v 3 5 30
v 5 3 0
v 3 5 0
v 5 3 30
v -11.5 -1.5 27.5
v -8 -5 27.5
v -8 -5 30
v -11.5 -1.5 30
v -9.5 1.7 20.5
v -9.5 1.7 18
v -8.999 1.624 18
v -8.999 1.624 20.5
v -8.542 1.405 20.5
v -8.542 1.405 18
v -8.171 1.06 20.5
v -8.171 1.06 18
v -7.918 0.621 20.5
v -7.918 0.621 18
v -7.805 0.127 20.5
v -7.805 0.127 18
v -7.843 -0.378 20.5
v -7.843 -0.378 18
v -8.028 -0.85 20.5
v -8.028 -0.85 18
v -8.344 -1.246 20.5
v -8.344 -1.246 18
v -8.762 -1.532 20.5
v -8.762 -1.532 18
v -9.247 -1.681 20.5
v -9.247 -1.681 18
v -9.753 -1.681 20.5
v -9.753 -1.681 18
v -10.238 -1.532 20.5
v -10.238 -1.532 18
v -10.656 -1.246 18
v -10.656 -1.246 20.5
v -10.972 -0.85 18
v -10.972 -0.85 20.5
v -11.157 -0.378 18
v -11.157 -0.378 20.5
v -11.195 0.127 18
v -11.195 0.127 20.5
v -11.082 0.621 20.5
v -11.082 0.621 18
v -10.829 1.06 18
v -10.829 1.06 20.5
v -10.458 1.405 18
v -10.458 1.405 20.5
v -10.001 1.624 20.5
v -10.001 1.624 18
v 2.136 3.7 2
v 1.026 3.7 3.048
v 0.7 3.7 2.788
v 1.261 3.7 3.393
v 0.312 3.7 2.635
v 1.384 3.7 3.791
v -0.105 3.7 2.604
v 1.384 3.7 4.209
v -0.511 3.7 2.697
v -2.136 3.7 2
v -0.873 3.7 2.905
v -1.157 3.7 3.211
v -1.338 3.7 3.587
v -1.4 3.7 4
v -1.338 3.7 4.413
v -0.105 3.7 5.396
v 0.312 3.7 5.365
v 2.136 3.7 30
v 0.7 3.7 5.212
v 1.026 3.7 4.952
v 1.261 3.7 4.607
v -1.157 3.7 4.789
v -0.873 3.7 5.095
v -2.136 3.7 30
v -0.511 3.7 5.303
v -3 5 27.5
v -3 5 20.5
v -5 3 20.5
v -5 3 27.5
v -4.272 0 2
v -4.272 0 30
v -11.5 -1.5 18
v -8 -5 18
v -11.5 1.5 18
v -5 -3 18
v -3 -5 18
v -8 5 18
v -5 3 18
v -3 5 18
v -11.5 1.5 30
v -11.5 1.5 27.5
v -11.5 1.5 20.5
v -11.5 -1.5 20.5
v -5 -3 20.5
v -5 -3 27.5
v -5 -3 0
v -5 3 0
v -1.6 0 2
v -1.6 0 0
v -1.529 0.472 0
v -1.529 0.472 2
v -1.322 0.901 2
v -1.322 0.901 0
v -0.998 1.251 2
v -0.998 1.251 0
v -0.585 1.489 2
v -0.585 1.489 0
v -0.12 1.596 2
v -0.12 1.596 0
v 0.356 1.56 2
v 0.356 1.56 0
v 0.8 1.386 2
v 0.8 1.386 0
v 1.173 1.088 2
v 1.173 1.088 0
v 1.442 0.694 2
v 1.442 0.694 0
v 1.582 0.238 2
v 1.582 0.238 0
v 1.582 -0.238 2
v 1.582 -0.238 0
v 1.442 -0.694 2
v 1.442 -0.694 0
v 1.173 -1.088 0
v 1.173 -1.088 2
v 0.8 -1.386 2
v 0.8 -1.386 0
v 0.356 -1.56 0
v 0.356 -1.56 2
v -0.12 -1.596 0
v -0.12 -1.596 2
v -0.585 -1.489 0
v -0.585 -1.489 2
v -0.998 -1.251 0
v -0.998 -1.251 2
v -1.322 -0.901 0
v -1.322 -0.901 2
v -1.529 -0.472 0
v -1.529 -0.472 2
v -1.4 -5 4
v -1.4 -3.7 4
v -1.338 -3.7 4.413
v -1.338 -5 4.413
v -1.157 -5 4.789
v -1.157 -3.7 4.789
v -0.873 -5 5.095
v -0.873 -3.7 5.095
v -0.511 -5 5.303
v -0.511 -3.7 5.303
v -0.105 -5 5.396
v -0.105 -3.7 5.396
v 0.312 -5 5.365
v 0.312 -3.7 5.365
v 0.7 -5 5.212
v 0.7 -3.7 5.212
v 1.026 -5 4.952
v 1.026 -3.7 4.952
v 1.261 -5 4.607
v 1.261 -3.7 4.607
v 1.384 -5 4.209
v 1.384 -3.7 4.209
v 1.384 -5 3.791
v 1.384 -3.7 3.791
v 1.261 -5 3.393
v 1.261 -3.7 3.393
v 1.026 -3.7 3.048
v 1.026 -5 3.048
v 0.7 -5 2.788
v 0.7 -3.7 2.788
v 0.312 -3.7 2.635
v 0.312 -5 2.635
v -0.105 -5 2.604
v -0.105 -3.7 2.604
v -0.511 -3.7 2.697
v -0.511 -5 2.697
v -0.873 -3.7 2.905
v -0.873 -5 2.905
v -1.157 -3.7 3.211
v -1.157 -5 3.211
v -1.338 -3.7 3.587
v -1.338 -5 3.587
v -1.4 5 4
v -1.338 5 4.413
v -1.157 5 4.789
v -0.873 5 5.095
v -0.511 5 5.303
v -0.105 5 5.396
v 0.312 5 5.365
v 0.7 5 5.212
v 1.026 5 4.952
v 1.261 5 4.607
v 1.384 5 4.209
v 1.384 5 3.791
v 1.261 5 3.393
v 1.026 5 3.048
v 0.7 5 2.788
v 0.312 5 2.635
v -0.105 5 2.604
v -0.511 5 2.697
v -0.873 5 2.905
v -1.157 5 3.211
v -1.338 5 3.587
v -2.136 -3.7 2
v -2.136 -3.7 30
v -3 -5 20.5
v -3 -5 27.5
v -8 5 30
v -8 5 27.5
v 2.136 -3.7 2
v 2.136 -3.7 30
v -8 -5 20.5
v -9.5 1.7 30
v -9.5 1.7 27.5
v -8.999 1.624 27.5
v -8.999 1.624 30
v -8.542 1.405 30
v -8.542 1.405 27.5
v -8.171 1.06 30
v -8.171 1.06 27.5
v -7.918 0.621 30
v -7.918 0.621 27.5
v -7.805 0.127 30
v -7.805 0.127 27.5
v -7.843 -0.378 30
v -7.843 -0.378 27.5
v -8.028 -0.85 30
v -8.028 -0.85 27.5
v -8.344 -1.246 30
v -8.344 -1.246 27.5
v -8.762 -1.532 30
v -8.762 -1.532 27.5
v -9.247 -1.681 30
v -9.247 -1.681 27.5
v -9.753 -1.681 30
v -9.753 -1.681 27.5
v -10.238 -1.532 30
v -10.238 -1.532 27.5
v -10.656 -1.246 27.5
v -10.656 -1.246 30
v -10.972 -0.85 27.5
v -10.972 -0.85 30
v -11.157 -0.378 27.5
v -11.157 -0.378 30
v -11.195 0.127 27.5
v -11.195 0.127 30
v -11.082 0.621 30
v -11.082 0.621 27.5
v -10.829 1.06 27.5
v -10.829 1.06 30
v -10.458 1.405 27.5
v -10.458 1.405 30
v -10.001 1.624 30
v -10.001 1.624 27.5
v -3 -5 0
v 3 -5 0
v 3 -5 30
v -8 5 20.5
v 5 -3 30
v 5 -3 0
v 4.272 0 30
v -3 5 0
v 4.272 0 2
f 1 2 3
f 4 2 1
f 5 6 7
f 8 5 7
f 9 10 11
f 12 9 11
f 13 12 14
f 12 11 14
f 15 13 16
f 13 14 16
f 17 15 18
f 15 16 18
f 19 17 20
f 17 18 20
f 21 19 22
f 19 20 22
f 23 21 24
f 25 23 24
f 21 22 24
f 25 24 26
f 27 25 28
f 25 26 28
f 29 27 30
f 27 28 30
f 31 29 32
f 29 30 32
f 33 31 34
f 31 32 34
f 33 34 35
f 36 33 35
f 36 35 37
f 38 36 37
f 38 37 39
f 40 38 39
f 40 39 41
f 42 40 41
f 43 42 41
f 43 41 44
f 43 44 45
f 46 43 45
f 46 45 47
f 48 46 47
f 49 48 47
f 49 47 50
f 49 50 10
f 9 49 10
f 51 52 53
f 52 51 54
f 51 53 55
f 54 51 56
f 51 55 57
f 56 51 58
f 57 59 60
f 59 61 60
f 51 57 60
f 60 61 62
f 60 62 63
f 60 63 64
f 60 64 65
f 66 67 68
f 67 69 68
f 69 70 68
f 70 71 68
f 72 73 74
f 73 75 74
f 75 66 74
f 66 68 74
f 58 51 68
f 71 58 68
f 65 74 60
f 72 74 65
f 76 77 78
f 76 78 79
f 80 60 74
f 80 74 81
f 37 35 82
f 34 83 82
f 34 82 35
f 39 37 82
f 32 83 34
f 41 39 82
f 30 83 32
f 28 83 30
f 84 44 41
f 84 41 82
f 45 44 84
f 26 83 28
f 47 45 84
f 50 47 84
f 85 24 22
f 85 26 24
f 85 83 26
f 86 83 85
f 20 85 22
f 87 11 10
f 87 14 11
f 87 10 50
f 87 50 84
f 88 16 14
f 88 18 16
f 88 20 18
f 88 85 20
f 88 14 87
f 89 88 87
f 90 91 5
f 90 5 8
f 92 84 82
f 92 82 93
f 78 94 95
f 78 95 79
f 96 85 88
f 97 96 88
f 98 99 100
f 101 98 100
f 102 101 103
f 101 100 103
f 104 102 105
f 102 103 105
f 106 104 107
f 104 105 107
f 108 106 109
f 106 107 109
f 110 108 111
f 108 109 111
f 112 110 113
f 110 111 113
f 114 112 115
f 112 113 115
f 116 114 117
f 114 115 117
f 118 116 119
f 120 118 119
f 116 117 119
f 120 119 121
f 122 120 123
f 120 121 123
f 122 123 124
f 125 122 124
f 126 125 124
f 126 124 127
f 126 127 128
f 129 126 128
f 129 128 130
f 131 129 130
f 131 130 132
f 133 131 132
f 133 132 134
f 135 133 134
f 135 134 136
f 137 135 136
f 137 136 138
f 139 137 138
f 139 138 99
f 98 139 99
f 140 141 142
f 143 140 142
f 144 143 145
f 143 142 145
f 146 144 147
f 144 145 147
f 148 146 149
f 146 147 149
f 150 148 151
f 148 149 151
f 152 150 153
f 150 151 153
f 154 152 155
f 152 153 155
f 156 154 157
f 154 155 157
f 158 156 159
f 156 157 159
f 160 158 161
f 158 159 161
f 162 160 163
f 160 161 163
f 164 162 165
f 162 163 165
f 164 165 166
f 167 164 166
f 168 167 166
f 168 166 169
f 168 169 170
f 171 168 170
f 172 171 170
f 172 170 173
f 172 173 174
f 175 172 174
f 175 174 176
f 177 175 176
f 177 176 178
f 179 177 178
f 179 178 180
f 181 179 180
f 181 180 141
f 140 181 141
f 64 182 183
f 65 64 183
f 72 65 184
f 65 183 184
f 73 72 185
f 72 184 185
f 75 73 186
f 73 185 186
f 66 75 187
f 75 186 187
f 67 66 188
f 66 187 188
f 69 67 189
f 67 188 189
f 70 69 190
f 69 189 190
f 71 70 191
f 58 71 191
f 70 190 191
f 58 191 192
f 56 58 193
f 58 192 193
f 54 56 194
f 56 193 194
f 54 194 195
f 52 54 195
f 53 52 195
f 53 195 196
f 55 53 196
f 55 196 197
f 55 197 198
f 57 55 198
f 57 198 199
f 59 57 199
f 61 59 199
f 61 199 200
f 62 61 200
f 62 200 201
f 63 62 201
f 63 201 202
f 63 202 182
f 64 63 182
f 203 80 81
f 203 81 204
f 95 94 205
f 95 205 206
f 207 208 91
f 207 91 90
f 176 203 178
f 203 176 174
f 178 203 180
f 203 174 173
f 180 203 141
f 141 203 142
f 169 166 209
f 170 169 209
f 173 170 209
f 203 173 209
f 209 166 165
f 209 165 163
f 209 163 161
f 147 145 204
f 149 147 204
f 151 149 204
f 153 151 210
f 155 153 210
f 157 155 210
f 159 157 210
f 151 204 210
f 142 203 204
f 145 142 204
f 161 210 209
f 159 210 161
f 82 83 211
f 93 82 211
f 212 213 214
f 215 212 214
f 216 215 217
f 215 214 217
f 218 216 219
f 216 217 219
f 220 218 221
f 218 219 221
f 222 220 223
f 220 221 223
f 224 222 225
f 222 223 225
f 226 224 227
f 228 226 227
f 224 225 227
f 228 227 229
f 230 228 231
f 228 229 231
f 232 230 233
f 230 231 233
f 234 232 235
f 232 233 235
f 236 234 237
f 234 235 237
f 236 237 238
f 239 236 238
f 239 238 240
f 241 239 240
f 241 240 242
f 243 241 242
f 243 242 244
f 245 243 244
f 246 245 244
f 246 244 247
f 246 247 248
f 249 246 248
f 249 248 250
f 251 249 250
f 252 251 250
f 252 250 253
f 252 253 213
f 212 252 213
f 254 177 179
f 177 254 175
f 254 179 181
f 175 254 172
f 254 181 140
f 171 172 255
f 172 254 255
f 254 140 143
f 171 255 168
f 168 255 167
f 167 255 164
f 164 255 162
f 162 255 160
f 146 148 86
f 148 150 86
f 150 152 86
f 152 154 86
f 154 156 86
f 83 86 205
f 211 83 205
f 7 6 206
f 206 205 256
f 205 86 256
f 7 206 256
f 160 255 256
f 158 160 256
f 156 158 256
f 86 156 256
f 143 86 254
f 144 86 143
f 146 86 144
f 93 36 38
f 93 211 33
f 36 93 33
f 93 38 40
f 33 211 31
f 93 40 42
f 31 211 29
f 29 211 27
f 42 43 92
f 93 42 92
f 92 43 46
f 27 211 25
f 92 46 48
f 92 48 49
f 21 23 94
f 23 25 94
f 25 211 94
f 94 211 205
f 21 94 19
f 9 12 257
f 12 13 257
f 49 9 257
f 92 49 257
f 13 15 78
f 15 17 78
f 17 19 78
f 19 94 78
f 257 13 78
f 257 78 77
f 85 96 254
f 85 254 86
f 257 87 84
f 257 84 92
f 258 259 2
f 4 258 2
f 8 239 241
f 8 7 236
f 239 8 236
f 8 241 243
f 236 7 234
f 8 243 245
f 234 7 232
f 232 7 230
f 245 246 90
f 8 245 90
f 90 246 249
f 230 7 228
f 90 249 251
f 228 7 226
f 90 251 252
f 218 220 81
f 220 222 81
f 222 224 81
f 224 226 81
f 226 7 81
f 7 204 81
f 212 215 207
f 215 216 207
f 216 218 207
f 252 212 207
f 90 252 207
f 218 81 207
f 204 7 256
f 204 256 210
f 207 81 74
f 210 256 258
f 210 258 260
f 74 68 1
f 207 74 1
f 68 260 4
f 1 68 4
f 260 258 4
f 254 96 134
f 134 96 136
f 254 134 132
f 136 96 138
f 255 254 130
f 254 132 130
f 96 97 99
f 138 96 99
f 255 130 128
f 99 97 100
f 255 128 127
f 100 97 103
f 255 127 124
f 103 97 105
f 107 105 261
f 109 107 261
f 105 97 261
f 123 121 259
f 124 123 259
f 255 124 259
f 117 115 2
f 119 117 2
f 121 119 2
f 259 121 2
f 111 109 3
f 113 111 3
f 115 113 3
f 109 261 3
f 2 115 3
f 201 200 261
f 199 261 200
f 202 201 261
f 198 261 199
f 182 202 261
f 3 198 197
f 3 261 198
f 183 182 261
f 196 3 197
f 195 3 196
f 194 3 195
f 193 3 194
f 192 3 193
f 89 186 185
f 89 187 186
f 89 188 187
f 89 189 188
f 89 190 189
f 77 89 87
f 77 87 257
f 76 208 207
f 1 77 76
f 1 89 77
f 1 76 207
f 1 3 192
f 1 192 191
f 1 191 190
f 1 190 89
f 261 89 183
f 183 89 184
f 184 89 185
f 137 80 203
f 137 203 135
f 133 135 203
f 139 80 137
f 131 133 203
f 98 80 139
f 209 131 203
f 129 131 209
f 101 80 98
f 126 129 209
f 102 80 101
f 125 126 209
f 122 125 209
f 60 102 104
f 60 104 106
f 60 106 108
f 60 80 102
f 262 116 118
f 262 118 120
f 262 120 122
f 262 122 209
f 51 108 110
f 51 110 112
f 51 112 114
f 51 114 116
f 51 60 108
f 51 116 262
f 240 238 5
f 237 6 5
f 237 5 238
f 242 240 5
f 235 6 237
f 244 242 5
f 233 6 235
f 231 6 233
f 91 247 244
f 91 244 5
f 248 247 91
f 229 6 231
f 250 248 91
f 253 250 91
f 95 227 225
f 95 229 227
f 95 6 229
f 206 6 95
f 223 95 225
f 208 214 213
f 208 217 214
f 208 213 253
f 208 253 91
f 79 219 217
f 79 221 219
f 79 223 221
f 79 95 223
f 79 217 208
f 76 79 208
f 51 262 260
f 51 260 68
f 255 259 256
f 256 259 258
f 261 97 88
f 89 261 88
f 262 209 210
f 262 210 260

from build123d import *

# Parameters (mm, degrees)
ESQUISSE1_W             = 10
ESQUISSE1_H             = 10
BOSS_EXTRU_1_DEPTH      = 30
ENL_V_MAT_EXTRU_1_DEPTH = 28
ESQUISSE3_R             = 1.6
ENL_V_MAT_EXTRU_2_DEPTH = 31.822070015
ESQUISSE4_W             = 2.5
ESQUISSE4_H             = 10
BOSS_EXTRU_2_DEPTH      = 6.5
CHANFREIN2_SIZE         = 3.5
ESQUISSE5_R             = 1.7
ENL_V_MAT_EXTRU_3_DEPTH = 22.937410968
CHANFREIN3_SIZE         = 2
ESQUISSE9_R             = 1.4
ENL_V_MAT_EXTRU_4_DEPTH = 10


with BuildPart() as part:
    # Esquisse1 → Boss.-Extru.1 (new body)
    with BuildSketch(Plane.XY):
        Rectangle(ESQUISSE1_W, ESQUISSE1_H)
    extrude(amount=BOSS_EXTRU_1_DEPTH)

    # Esquisse2 → Enlèv. mat.-Extru.1 (cut)
    with BuildSketch(Plane.XY.offset(30)):
        Polygon((-4.272391992, 0), (-2.136195996, -3.7), (2.136195996, -3.7), (4.272391992, 0), (2.136195996, 3.7), (-2.136195996, 3.7), align=None)
    extrude(amount=-ENL_V_MAT_EXTRU_1_DEPTH, mode=Mode.SUBTRACT)

    # Esquisse3 → Enlèv. mat.-Extru.2 (cut, through all)
    with BuildSketch(Plane(origin=(0, 0, 0), x_dir=(-1, 0, 0), z_dir=(0, 0, -1))):
        Circle(ESQUISSE3_R)
    extrude(amount=-ENL_V_MAT_EXTRU_2_DEPTH, mode=Mode.SUBTRACT)

    # Esquisse4 → Boss.-Extru.2 (add)
    with BuildSketch(Plane.ZY.offset(5)):
        with Locations((28.75, 0)):
            Rectangle(ESQUISSE4_W, ESQUISSE4_H)
        with Locations((19.25, 0)):
            Rectangle(ESQUISSE4_W, ESQUISSE4_H)
    extrude(amount=BOSS_EXTRU_2_DEPTH)

    # Chanfrein2
    chanfrein2_edges = [part.edges().sort_by_distance(p)[0] for p in [
        (-11.5, -5, 28.75),
        (-11.5, 5, 28.75),
        (-11.5, -5, 19.25),
        (-11.5, 5, 19.25),
    ]]
    chamfer(chanfrein2_edges, length=CHANFREIN2_SIZE)

    # Esquisse5 → Enlèv. mat.-Extru.3 (cut, through all)
    with BuildSketch(Plane(origin=(0, 0, 18), x_dir=(-1, 0, 0), z_dir=(0, 0, -1))):
        with Locations(Location((9.5, 0, 0), (0, 0, 90))):
            Circle(ESQUISSE5_R)
    extrude(amount=-ENL_V_MAT_EXTRU_3_DEPTH, mode=Mode.SUBTRACT)

    # Chanfrein3
    chanfrein3_edges = [part.edges().sort_by_distance(p)[0] for p in [
        (-5, 5, 24),
        (-5, -5, 24),
        (5, -5, 15),
        (5, 5, 15),
        (-5, 5, 9),
        (-5, -5, 9),
    ]]
    chamfer(chanfrein3_edges, length=CHANFREIN3_SIZE)

    # Esquisse9 → Enlèv. mat.-Extru.4 (cut)
    with BuildSketch(Plane(origin=(0, 5, 0), x_dir=(1, 0, 0), z_dir=(0, 1, 0))):
        with Locations(Location((0, -4, 0), (0, 0, 180))):
            Circle(ESQUISSE9_R)
    extrude(amount=-ENL_V_MAT_EXTRU_4_DEPTH, mode=Mode.SUBTRACT)


solid = part.part
